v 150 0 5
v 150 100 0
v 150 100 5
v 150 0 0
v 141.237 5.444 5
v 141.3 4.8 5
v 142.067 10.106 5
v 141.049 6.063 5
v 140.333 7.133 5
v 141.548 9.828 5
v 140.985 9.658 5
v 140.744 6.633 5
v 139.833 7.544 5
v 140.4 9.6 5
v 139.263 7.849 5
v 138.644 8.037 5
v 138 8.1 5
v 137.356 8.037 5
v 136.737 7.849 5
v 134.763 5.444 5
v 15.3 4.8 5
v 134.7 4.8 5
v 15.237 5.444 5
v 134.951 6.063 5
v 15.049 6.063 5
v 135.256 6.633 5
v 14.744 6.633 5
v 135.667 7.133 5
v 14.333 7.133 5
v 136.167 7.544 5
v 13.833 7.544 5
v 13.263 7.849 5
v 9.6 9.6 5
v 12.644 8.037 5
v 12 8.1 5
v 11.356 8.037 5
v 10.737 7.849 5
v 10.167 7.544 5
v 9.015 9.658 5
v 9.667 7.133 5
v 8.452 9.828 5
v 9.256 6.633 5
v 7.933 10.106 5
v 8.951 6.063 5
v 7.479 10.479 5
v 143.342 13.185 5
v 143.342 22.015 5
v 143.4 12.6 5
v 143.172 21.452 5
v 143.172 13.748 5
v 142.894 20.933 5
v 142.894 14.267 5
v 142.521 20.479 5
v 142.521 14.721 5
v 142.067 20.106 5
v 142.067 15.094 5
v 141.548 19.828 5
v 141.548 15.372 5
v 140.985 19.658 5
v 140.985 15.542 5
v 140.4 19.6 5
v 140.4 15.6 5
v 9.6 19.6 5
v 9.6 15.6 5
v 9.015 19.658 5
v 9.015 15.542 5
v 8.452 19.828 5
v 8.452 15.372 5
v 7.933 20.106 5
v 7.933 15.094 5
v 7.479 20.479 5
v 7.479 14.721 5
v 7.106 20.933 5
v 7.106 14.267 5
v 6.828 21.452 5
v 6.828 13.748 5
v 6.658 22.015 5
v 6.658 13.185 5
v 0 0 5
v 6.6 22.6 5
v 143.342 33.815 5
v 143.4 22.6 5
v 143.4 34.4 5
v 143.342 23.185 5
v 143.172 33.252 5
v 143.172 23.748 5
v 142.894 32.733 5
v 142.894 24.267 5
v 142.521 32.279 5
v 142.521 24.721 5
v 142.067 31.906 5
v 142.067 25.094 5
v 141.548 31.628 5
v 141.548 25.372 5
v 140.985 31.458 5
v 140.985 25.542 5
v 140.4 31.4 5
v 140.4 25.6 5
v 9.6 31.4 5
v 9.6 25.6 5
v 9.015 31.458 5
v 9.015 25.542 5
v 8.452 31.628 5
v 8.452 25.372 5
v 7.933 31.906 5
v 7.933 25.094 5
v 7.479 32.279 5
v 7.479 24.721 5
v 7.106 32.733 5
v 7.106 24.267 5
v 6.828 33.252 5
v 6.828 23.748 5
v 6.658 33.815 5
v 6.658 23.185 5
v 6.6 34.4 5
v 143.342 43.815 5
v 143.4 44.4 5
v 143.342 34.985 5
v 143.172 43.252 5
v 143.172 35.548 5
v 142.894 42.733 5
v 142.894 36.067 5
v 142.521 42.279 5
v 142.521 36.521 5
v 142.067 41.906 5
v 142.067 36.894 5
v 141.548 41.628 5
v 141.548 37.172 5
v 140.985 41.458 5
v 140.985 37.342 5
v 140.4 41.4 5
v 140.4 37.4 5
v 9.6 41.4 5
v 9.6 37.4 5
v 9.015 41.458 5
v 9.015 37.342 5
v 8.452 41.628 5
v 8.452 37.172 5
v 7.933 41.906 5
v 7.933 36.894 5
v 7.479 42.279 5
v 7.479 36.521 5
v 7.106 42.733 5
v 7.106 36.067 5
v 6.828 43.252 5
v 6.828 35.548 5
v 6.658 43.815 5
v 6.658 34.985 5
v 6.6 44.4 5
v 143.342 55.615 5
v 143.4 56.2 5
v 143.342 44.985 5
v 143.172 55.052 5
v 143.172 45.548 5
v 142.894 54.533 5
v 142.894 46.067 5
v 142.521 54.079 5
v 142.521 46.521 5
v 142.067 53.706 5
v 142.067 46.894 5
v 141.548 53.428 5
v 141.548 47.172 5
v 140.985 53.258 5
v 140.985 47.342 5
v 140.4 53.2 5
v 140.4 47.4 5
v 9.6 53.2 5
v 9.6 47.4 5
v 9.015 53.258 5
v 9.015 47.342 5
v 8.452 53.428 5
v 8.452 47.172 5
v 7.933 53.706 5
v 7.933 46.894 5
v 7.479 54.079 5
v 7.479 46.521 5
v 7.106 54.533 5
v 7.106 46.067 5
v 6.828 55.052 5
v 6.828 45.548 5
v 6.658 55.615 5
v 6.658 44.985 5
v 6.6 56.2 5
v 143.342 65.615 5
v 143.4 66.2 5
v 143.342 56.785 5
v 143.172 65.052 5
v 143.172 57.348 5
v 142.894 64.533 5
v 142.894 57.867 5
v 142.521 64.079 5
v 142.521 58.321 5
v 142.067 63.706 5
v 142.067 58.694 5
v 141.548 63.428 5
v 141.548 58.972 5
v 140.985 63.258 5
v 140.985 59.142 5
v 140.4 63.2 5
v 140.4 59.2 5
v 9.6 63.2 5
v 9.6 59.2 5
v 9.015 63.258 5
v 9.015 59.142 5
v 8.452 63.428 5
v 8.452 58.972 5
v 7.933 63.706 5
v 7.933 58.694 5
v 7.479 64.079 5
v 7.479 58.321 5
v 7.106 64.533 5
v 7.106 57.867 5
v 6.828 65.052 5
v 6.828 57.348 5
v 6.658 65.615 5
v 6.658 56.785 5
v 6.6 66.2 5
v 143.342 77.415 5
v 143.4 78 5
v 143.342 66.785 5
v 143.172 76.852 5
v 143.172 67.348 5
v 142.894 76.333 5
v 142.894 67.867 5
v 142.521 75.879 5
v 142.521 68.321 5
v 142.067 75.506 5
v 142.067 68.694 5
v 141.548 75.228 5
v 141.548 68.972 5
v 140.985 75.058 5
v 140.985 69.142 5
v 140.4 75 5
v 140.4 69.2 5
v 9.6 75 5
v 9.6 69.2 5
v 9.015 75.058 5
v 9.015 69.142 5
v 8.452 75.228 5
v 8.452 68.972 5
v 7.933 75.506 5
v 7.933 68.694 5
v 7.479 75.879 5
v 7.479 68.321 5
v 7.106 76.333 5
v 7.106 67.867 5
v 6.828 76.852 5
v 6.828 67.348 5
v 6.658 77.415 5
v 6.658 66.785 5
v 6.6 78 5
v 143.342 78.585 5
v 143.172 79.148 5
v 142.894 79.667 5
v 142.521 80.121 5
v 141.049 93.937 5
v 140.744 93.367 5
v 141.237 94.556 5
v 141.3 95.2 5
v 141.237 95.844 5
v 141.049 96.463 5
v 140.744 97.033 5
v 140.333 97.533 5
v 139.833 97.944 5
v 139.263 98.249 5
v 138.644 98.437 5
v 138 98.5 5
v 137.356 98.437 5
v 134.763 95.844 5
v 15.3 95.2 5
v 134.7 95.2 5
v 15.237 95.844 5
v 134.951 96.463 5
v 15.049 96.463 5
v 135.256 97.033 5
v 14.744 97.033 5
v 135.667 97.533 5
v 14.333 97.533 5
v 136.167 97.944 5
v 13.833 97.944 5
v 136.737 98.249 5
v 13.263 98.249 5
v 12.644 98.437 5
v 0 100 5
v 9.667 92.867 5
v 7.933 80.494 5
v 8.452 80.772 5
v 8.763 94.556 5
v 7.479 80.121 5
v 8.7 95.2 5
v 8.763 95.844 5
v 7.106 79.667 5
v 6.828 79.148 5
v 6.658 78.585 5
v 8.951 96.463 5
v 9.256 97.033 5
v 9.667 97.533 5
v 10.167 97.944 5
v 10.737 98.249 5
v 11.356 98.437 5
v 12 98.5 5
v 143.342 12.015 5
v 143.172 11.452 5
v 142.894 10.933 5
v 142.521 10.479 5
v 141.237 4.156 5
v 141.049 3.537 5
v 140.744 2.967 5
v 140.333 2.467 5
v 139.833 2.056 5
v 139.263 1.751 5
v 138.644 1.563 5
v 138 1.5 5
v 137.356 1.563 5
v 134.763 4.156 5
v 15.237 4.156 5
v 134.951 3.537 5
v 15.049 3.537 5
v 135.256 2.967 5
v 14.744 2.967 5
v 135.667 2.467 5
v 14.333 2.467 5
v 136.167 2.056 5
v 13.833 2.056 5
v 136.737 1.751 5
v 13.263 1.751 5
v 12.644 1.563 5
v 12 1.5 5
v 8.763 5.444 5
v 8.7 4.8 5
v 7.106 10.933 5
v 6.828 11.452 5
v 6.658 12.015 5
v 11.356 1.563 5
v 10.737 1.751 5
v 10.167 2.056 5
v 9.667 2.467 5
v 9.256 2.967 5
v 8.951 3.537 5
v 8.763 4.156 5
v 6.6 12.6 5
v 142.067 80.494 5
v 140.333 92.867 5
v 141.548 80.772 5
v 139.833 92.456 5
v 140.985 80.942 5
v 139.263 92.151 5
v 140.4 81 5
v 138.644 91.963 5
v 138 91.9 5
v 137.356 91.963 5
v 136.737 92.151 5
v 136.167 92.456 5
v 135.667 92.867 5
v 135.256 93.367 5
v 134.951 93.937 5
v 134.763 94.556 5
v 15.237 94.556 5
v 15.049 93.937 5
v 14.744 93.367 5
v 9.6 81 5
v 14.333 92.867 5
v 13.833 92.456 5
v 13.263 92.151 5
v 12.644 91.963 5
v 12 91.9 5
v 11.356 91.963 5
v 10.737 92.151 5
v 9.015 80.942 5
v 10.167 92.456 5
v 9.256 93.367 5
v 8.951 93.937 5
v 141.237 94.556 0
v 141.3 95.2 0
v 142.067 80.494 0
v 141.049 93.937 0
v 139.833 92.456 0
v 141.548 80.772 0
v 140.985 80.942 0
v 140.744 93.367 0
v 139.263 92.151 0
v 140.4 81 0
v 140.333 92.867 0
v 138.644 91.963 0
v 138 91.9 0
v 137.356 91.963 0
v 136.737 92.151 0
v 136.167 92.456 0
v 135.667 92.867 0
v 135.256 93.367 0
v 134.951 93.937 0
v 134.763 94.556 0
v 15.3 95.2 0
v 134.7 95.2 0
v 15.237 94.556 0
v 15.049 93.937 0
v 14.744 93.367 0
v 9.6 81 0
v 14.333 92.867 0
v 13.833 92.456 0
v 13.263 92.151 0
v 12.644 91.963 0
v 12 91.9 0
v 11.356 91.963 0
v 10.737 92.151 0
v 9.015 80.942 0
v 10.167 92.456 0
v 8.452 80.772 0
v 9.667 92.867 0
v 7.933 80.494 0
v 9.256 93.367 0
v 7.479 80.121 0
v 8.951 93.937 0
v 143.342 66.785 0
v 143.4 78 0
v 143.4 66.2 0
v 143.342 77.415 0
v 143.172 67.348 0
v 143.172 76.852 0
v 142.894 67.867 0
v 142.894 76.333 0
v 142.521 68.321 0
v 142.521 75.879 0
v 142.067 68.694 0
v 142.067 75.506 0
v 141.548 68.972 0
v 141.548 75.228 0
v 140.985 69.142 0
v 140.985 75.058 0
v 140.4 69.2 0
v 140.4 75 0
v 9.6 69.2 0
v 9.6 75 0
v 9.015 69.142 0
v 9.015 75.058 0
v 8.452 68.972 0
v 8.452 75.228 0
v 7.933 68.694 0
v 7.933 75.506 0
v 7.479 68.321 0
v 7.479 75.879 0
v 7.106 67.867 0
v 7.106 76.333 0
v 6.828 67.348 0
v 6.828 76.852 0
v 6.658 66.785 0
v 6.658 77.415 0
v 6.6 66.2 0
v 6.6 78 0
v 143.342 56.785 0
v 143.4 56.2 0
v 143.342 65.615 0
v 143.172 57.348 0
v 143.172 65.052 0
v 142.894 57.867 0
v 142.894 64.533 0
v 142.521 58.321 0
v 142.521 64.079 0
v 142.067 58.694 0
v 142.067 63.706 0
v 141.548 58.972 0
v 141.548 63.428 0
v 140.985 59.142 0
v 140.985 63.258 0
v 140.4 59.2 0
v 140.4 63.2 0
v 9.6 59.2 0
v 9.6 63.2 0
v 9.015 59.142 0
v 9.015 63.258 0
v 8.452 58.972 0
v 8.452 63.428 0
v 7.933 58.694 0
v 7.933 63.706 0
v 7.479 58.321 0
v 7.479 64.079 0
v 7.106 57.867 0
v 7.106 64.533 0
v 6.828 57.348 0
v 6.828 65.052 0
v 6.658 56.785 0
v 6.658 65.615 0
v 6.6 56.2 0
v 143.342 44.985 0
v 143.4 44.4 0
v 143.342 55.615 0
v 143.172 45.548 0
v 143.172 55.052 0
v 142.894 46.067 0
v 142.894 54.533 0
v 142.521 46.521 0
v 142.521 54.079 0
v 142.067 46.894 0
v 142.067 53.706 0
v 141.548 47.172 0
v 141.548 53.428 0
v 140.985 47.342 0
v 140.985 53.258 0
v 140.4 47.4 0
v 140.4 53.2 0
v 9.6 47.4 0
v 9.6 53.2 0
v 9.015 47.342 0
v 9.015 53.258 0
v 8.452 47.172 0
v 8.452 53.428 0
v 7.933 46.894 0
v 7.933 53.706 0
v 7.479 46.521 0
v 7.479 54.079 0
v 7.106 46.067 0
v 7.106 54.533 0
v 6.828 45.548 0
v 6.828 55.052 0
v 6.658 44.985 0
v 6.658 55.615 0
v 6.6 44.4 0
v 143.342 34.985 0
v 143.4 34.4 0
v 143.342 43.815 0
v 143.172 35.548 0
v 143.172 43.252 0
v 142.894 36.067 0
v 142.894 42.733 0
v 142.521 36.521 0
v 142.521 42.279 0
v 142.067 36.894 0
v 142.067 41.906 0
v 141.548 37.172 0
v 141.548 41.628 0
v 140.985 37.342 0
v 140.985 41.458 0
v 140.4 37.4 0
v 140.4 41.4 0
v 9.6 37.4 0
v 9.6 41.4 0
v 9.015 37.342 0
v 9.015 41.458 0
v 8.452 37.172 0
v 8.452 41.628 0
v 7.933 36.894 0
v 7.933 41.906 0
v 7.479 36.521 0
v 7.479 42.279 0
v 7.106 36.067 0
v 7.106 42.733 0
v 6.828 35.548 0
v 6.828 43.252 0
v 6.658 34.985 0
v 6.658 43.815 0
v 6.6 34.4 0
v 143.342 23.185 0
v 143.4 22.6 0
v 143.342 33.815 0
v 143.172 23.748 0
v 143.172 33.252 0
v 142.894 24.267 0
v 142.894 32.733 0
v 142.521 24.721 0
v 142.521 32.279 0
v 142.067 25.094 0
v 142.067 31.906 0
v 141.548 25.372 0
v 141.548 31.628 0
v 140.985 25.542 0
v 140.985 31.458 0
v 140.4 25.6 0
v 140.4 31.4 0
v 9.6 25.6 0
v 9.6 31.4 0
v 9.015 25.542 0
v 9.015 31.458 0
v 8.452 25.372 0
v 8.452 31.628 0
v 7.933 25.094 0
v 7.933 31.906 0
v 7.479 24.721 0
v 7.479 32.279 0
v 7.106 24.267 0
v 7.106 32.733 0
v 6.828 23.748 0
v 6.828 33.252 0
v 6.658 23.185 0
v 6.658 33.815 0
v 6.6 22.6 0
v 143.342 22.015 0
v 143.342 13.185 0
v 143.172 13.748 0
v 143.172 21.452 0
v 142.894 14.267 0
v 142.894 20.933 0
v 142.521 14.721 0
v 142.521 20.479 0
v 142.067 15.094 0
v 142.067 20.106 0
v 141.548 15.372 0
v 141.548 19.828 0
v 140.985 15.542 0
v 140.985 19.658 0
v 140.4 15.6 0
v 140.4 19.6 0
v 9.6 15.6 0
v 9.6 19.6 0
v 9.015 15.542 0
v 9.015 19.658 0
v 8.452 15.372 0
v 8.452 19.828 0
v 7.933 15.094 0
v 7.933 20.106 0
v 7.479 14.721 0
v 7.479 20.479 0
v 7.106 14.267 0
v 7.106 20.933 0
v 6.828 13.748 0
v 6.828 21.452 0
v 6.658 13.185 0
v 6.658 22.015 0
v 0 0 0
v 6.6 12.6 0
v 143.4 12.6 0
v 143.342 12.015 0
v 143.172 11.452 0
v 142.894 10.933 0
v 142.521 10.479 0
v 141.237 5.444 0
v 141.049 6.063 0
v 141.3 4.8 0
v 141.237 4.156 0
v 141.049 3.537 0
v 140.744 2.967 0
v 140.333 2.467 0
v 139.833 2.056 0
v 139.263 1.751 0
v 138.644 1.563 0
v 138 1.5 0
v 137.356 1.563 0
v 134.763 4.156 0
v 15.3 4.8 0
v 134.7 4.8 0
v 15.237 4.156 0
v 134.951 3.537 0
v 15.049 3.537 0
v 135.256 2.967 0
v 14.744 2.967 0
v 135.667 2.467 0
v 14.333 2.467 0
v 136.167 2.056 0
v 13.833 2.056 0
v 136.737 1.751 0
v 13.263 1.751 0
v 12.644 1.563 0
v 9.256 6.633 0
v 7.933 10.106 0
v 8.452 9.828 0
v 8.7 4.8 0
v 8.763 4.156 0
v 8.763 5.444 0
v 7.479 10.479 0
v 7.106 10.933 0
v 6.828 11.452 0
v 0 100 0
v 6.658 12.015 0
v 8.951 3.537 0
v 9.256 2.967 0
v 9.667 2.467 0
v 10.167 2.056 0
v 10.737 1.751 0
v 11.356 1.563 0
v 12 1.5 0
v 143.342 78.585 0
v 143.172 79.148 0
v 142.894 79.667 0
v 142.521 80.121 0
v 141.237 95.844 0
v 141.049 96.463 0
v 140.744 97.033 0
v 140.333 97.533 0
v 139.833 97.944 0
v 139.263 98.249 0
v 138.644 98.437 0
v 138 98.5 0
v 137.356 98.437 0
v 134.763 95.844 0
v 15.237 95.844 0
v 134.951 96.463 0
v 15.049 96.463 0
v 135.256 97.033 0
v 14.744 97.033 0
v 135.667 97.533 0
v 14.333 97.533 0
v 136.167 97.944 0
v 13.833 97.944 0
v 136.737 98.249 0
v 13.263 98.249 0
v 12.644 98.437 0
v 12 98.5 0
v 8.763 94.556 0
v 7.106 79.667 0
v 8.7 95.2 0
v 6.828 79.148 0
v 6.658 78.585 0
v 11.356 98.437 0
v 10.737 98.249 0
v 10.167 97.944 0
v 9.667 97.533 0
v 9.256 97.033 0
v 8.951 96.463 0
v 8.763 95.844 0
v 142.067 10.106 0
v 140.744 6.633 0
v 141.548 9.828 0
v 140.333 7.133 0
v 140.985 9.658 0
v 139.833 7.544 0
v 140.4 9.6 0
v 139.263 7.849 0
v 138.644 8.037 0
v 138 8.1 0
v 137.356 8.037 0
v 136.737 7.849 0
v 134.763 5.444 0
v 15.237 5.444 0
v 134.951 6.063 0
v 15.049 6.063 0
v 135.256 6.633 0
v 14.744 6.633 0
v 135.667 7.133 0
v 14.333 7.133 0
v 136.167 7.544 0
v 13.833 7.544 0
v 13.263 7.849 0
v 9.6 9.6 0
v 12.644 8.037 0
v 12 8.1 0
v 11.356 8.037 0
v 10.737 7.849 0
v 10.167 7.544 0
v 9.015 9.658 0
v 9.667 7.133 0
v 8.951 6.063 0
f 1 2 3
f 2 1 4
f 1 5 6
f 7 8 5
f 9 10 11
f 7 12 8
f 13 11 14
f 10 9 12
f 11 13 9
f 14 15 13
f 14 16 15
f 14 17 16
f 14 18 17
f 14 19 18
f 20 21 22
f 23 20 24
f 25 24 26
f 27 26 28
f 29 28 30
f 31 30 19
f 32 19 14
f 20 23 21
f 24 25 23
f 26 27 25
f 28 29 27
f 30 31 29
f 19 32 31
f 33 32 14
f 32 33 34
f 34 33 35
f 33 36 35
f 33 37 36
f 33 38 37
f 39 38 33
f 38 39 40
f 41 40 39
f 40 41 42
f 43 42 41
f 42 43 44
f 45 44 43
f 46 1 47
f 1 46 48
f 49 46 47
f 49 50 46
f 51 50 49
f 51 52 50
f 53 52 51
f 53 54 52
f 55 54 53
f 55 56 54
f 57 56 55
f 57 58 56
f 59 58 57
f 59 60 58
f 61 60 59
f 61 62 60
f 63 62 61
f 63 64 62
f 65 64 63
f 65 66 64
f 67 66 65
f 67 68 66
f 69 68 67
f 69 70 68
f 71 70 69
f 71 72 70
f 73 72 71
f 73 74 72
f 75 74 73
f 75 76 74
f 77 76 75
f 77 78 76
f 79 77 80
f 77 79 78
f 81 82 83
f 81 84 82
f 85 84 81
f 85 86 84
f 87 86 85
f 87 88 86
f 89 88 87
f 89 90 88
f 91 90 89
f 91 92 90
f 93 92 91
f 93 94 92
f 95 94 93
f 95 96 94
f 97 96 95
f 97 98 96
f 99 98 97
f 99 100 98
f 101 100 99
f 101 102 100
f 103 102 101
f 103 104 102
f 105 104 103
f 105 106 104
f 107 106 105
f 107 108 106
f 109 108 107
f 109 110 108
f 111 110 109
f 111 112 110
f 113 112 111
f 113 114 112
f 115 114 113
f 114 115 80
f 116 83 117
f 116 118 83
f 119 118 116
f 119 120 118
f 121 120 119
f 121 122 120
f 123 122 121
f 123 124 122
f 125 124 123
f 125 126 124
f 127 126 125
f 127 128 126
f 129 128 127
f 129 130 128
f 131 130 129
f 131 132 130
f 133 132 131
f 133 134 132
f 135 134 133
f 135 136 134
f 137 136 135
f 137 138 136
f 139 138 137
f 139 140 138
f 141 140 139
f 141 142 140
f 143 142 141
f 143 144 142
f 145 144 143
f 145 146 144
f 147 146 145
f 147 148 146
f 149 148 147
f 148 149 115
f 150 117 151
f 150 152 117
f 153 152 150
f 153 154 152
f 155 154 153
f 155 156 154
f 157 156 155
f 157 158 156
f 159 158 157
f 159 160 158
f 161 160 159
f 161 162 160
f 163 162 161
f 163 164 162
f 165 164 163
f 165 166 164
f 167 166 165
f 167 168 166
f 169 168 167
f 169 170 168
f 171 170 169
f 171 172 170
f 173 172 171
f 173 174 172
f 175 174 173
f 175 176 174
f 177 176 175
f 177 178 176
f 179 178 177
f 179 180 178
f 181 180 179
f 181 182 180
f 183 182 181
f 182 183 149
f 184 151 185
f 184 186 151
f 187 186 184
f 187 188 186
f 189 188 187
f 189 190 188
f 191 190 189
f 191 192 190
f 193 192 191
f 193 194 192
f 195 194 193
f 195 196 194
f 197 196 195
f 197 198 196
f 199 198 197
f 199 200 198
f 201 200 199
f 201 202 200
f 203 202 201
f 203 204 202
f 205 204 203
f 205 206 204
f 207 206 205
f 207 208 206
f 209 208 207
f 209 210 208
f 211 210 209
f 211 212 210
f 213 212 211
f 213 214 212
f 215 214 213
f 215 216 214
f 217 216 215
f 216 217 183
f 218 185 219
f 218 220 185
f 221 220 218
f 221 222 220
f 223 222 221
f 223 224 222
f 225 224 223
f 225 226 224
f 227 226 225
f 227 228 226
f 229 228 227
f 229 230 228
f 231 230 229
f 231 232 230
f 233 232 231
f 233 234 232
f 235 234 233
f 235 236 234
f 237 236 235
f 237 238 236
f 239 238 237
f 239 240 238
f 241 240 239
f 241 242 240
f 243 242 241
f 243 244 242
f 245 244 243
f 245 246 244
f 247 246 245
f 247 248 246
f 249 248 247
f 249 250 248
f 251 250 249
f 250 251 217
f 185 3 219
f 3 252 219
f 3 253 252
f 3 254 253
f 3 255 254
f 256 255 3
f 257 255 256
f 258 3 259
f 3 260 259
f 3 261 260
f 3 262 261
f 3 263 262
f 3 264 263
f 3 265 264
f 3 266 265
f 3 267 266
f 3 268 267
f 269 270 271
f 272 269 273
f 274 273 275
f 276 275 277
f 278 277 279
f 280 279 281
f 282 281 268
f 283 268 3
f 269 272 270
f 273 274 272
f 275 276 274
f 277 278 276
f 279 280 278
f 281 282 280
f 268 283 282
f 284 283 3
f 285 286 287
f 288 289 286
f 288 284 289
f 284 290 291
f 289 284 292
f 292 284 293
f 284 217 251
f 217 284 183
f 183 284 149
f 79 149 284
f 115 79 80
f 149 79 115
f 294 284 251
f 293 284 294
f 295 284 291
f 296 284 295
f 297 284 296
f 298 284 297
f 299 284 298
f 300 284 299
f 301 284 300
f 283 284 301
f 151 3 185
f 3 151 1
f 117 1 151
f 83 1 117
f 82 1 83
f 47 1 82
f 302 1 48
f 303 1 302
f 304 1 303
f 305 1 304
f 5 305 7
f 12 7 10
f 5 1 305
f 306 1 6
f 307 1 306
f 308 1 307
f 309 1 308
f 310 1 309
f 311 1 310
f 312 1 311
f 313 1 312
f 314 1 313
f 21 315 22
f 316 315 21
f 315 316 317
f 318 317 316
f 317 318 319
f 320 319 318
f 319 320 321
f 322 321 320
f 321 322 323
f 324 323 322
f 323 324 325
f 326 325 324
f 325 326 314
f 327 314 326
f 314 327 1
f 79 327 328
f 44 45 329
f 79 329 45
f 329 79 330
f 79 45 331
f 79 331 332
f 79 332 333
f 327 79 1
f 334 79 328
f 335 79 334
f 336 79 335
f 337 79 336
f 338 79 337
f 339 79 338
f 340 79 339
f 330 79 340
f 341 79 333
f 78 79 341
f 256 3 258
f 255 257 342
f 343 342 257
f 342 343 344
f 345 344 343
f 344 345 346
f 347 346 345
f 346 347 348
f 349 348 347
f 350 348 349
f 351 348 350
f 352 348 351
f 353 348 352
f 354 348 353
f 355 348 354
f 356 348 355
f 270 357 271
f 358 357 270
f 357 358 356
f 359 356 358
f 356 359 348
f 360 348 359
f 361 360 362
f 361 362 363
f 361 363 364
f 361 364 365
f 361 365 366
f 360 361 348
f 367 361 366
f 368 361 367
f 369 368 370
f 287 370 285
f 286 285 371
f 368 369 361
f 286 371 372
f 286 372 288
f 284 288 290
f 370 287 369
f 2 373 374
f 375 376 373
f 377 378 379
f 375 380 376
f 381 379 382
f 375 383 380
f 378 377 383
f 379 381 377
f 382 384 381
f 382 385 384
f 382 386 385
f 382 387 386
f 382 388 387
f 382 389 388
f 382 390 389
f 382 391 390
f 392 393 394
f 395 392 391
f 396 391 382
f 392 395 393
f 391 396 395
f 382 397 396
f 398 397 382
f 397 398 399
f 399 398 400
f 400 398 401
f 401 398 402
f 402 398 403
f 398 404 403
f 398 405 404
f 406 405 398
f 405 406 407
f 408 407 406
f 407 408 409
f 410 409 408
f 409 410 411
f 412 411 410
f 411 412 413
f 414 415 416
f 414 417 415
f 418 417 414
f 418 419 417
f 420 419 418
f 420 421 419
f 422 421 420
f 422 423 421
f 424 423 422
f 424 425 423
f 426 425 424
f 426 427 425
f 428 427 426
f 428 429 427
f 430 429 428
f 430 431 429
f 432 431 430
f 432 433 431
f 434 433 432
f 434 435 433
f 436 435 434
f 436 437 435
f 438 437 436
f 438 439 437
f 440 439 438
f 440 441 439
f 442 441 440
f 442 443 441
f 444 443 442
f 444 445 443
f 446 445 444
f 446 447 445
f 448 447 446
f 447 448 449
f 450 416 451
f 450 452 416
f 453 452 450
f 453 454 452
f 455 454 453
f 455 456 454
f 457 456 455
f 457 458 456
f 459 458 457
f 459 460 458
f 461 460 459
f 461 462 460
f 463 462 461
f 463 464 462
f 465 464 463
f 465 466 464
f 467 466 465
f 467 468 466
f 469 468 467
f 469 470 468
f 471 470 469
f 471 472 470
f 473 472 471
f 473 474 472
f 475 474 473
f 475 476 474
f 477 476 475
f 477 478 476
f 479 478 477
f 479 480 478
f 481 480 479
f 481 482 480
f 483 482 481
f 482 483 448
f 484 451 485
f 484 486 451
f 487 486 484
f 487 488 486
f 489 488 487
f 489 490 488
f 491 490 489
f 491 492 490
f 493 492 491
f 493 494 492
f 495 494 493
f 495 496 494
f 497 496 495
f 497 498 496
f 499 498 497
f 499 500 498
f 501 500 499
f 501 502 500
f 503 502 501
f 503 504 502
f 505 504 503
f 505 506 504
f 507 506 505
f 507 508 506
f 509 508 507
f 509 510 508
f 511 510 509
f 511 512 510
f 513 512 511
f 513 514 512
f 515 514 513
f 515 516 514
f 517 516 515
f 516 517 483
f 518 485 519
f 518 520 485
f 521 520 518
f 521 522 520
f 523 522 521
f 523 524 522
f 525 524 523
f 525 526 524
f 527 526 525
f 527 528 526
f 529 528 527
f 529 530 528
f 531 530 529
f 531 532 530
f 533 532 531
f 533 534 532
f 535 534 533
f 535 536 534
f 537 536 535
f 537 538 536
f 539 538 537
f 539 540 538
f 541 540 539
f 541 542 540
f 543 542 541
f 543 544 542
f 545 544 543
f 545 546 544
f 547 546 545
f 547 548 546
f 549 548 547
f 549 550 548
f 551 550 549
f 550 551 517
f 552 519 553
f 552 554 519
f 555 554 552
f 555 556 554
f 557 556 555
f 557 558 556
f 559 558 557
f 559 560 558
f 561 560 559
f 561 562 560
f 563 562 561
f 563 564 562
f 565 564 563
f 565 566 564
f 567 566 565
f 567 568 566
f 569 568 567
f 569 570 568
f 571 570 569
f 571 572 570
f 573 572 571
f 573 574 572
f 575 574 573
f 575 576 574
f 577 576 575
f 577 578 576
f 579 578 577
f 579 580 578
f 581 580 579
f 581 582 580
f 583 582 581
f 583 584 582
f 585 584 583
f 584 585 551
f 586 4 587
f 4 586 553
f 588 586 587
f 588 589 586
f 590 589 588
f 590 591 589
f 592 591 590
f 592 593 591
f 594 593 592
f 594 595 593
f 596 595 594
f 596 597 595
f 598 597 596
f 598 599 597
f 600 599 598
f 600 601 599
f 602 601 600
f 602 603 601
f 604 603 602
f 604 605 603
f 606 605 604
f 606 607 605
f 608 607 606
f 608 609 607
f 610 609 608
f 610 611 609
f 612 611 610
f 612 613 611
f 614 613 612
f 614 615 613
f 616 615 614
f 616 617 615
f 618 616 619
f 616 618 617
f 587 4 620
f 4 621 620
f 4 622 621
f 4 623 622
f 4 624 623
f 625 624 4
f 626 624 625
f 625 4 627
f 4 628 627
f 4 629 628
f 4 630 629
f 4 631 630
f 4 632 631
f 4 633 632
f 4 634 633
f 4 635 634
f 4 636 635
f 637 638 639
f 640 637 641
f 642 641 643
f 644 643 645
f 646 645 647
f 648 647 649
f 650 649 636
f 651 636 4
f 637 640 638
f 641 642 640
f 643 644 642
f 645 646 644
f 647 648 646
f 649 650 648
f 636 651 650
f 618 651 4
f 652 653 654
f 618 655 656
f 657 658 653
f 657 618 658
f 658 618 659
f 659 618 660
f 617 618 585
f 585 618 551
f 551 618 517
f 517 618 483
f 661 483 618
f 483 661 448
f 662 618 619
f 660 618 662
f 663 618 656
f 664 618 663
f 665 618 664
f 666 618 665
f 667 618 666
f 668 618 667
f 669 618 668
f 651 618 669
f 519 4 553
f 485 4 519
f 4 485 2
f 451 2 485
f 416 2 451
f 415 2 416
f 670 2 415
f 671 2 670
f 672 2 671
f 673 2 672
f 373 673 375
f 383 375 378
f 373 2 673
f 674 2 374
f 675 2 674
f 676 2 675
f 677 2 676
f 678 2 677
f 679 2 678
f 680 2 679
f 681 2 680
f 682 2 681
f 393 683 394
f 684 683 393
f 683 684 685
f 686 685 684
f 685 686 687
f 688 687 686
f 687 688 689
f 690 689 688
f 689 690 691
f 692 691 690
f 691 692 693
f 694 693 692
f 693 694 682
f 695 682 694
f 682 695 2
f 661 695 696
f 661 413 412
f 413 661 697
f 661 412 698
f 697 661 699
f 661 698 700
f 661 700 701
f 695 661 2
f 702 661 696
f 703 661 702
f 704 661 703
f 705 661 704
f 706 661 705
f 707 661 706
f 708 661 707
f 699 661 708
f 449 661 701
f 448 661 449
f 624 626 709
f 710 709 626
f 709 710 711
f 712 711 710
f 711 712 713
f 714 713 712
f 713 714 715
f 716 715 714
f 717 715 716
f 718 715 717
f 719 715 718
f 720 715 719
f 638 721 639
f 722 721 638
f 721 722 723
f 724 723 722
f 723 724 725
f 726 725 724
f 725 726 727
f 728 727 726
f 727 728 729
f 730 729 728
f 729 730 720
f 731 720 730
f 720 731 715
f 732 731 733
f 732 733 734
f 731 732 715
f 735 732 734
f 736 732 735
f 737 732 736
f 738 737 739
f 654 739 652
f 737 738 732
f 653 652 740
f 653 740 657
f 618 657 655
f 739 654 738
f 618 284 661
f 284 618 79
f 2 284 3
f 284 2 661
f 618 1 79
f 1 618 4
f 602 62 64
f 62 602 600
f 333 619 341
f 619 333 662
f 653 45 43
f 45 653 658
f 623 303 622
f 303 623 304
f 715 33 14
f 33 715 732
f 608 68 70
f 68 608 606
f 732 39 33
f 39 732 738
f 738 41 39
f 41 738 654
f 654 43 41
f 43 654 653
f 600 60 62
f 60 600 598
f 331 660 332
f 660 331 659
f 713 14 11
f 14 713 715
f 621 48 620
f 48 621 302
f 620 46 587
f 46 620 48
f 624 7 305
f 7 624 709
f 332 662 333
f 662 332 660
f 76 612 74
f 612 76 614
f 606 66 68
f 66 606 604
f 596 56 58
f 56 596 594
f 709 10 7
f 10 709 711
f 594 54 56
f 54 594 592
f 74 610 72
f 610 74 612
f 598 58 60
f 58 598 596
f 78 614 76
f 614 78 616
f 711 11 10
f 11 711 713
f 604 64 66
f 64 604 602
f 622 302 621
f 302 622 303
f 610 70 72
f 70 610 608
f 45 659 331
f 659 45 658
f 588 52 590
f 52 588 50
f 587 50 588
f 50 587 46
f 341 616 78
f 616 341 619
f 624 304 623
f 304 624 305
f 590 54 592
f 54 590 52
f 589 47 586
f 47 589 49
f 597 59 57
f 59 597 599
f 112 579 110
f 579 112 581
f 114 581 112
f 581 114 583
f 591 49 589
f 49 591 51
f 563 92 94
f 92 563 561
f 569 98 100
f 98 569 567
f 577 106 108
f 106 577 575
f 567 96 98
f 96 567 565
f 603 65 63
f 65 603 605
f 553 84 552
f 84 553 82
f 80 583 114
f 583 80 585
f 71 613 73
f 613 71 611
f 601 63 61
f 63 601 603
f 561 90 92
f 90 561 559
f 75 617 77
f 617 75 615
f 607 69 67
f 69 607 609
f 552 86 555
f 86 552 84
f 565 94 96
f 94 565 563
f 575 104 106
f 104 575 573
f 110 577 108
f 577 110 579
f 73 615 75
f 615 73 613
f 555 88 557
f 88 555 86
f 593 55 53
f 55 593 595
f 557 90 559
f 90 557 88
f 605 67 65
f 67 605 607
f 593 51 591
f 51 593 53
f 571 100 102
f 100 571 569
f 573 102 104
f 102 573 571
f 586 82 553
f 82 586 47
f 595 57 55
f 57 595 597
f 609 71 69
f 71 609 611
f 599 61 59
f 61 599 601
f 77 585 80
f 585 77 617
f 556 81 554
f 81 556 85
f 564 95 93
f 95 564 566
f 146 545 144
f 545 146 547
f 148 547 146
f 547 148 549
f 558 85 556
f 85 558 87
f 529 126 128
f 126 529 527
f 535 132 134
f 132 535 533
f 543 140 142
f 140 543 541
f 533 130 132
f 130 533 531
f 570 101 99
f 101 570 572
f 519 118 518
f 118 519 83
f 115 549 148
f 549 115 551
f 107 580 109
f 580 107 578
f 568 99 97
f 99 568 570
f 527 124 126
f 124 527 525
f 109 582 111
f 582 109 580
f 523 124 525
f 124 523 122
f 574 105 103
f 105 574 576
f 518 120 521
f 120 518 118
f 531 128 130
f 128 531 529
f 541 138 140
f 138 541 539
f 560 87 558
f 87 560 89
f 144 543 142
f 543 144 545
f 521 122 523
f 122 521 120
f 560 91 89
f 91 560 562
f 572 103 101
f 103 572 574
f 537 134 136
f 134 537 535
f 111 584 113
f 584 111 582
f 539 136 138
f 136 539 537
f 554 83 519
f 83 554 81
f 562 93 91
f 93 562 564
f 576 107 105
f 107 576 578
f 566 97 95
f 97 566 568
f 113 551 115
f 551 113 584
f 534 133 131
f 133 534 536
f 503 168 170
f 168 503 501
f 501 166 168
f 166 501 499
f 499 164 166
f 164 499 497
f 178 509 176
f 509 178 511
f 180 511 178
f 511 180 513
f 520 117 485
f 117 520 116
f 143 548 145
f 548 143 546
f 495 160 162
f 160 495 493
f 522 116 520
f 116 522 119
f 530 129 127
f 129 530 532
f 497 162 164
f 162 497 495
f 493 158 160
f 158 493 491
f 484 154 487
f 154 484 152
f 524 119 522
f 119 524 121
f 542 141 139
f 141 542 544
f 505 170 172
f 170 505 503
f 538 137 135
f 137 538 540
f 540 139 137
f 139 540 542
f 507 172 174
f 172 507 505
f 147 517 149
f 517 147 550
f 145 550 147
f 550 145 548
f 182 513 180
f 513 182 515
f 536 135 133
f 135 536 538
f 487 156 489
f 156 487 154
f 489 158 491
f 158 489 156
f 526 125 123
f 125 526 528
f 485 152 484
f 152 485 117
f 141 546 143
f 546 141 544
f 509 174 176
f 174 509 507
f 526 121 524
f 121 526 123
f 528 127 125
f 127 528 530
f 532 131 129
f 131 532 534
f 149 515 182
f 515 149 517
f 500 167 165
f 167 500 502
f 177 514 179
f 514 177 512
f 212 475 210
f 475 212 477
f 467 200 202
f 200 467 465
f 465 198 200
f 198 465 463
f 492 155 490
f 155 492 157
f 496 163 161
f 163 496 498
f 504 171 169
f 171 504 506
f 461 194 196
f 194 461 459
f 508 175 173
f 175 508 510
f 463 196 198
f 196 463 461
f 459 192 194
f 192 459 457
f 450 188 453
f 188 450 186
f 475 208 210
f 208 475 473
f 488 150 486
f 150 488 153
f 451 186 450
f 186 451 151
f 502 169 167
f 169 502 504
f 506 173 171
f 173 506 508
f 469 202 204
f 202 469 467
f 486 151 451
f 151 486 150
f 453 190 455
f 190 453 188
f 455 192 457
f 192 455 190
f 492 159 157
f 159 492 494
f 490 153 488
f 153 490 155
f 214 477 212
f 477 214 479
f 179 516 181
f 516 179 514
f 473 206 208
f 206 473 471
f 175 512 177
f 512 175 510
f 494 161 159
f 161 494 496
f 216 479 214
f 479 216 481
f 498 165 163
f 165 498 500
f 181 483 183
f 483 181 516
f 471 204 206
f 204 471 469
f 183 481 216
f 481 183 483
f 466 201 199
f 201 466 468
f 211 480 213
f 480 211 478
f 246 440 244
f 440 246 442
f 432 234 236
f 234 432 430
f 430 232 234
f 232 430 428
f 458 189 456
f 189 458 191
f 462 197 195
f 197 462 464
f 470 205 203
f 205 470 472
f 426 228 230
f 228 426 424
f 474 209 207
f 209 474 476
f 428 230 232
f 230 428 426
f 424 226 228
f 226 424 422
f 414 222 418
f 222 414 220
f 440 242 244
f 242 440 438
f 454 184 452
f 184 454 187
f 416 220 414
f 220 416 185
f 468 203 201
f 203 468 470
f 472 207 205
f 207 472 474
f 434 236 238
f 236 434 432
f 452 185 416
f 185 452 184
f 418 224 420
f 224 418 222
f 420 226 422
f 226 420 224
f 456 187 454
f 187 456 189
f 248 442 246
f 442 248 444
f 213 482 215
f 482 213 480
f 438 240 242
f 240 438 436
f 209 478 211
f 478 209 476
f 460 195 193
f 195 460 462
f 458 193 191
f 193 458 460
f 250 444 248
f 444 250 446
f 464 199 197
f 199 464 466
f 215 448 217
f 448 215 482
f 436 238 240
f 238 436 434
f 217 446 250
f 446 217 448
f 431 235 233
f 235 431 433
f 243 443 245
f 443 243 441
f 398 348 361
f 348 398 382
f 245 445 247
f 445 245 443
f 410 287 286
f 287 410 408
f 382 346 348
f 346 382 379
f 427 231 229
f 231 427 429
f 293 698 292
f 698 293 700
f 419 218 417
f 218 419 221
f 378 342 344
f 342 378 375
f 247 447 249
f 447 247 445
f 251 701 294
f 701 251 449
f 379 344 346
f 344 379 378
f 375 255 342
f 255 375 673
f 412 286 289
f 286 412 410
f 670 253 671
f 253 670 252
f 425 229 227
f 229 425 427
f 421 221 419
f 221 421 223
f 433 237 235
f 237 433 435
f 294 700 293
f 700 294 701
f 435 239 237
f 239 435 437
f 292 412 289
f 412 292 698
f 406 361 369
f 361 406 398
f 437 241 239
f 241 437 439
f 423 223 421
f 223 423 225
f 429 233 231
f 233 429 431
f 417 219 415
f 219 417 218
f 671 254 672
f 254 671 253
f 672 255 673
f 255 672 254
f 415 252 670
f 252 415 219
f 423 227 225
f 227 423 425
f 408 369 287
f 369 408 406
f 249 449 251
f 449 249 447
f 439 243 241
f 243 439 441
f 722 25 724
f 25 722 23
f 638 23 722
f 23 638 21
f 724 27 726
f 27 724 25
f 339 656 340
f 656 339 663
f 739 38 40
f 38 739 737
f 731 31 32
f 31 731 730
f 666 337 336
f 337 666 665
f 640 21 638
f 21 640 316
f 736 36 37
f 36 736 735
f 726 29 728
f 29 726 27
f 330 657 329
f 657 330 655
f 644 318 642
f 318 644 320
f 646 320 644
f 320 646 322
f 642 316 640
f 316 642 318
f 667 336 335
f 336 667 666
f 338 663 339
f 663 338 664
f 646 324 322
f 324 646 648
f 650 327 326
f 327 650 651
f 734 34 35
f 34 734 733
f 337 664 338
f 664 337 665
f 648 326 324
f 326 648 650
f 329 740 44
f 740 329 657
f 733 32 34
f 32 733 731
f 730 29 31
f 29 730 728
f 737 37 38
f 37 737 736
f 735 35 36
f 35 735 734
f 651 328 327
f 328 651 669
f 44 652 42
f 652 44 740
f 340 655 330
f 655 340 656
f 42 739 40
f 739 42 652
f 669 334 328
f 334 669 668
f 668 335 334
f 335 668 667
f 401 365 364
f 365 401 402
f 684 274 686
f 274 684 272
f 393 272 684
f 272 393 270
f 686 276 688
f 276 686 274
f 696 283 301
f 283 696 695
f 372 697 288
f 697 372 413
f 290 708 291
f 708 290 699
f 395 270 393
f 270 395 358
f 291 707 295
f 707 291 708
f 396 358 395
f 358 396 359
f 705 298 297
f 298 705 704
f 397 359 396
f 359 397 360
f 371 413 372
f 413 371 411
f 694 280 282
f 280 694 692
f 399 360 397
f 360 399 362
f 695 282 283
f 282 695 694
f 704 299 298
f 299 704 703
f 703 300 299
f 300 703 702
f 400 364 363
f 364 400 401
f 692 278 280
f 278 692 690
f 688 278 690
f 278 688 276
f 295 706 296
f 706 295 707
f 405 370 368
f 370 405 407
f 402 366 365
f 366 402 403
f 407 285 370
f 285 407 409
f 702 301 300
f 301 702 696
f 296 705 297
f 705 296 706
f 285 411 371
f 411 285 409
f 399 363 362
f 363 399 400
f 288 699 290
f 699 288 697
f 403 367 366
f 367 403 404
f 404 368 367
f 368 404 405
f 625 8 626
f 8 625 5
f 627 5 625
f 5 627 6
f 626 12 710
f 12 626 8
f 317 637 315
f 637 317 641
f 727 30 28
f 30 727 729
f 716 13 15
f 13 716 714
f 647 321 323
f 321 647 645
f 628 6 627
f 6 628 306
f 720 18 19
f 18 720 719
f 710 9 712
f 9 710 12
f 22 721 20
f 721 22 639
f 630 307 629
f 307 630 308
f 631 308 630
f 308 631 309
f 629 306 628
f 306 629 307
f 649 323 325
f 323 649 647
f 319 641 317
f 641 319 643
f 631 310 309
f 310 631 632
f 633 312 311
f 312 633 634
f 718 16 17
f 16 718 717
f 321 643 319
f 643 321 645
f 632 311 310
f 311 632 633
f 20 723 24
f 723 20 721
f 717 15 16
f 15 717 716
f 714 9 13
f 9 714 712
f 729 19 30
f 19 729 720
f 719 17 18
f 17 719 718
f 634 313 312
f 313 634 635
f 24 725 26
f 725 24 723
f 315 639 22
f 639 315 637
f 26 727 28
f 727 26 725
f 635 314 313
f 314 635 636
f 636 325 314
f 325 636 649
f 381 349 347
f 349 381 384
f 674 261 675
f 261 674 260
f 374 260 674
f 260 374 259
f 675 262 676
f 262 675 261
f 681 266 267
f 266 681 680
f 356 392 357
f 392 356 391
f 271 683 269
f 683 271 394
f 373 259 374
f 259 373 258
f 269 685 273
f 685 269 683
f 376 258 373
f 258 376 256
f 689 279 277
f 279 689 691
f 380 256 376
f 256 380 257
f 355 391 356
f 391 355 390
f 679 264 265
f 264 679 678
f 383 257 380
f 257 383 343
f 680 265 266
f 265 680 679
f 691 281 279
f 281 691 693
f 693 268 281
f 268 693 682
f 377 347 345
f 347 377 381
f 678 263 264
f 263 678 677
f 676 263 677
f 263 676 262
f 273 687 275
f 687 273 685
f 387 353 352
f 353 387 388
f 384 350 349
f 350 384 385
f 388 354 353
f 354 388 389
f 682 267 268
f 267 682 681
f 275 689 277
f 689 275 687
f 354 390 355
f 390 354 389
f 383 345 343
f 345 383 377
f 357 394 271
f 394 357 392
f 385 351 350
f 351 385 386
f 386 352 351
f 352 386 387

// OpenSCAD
$fn = 32;

// ----------------------------------------------------------------------
// Slotted panel: 150 x 100 mm, 7 рядов of slots
// ----------------------------------------------------------------------

// --- parameters (mm) ---
panel_w = 150;            // panel width
panel_d = 100;            // panel depth
thick = 5;                // panel thickness
slot_w = 6;               // slot width
pitch0 = 10;              // first row pitch
pitch_step = 1.8;         // pitch increase per row
margin = 9.6;             // margin around the slot field
rows = 7;                 // number of slot rows
mount_d = 6.6;            // mounting holes
mount_x = 63;             // mounting hole offset

difference() {
  union() {
    cube([panel_w, panel_d, thick]);
  }
  /* slot rows: stadium shaped cutters, 2.5 mm clear of both faces */
  /* row 0: pitch 10, length 130.8 */
  hull() {
    translate([9.6, 12.6, -2.5]) cylinder(h = thick + 5, d = slot_w);
    translate([140.4, 12.6, -2.5]) cylinder(h = thick + 5, d = slot_w);
  }
  /* row 1: pitch 11.8, length 130.8 */
  hull() {
    translate([9.6, 22.6, -2.5]) cylinder(h = thick + 5, d = slot_w);
    translate([140.4, 22.6, -2.5]) cylinder(h = thick + 5, d = slot_w);
  }
  /* row 2: pitch 10, length 130.8 */
  hull() {
    translate([9.6, 34.4, -2.5]) cylinder(h = thick + 5, d = slot_w);
    translate([140.4, 34.4, -2.5]) cylinder(h = thick + 5, d = slot_w);
  }
  /* row 3: pitch 11.8, length 130.8 */
  hull() {
    translate([9.6, 44.4, -2.5]) cylinder(h = thick + 5, d = slot_w);
    translate([140.4, 44.4, -2.5]) cylinder(h = thick + 5, d = slot_w);
  }
  /* row 4: pitch 10, length 130.8 */
  hull() {
    translate([9.6, 56.2, -2.5]) cylinder(h = thick + 5, d = slot_w);
    translate([140.4, 56.2, -2.5]) cylinder(h = thick + 5, d = slot_w);
  }
  /* row 5: pitch 11.8, length 130.8 */
  hull() {
    translate([9.6, 66.2, -2.5]) cylinder(h = thick + 5, d = slot_w);
    translate([140.4, 66.2, -2.5]) cylinder(h = thick + 5, d = slot_w);
  }
  /* row 6: pitch 10, length 130.8 */
  hull() {
    translate([9.6, 78, -2.5]) cylinder(h = thick + 5, d = slot_w);
    translate([140.4, 78, -2.5]) cylinder(h = thick + 5, d = slot_w);
  }
  translate([12, 4.8, -2.5]) cylinder(h = 10, d = mount_d);
  translate([12, 95.2, -2.5]) cylinder(h = 10, d = mount_d);
  translate([138, 4.8, -2.5]) cylinder(h = 10, d = mount_d);
  translate([138, 95.2, -2.5]) cylinder(h = 10, d = mount_d);
}
